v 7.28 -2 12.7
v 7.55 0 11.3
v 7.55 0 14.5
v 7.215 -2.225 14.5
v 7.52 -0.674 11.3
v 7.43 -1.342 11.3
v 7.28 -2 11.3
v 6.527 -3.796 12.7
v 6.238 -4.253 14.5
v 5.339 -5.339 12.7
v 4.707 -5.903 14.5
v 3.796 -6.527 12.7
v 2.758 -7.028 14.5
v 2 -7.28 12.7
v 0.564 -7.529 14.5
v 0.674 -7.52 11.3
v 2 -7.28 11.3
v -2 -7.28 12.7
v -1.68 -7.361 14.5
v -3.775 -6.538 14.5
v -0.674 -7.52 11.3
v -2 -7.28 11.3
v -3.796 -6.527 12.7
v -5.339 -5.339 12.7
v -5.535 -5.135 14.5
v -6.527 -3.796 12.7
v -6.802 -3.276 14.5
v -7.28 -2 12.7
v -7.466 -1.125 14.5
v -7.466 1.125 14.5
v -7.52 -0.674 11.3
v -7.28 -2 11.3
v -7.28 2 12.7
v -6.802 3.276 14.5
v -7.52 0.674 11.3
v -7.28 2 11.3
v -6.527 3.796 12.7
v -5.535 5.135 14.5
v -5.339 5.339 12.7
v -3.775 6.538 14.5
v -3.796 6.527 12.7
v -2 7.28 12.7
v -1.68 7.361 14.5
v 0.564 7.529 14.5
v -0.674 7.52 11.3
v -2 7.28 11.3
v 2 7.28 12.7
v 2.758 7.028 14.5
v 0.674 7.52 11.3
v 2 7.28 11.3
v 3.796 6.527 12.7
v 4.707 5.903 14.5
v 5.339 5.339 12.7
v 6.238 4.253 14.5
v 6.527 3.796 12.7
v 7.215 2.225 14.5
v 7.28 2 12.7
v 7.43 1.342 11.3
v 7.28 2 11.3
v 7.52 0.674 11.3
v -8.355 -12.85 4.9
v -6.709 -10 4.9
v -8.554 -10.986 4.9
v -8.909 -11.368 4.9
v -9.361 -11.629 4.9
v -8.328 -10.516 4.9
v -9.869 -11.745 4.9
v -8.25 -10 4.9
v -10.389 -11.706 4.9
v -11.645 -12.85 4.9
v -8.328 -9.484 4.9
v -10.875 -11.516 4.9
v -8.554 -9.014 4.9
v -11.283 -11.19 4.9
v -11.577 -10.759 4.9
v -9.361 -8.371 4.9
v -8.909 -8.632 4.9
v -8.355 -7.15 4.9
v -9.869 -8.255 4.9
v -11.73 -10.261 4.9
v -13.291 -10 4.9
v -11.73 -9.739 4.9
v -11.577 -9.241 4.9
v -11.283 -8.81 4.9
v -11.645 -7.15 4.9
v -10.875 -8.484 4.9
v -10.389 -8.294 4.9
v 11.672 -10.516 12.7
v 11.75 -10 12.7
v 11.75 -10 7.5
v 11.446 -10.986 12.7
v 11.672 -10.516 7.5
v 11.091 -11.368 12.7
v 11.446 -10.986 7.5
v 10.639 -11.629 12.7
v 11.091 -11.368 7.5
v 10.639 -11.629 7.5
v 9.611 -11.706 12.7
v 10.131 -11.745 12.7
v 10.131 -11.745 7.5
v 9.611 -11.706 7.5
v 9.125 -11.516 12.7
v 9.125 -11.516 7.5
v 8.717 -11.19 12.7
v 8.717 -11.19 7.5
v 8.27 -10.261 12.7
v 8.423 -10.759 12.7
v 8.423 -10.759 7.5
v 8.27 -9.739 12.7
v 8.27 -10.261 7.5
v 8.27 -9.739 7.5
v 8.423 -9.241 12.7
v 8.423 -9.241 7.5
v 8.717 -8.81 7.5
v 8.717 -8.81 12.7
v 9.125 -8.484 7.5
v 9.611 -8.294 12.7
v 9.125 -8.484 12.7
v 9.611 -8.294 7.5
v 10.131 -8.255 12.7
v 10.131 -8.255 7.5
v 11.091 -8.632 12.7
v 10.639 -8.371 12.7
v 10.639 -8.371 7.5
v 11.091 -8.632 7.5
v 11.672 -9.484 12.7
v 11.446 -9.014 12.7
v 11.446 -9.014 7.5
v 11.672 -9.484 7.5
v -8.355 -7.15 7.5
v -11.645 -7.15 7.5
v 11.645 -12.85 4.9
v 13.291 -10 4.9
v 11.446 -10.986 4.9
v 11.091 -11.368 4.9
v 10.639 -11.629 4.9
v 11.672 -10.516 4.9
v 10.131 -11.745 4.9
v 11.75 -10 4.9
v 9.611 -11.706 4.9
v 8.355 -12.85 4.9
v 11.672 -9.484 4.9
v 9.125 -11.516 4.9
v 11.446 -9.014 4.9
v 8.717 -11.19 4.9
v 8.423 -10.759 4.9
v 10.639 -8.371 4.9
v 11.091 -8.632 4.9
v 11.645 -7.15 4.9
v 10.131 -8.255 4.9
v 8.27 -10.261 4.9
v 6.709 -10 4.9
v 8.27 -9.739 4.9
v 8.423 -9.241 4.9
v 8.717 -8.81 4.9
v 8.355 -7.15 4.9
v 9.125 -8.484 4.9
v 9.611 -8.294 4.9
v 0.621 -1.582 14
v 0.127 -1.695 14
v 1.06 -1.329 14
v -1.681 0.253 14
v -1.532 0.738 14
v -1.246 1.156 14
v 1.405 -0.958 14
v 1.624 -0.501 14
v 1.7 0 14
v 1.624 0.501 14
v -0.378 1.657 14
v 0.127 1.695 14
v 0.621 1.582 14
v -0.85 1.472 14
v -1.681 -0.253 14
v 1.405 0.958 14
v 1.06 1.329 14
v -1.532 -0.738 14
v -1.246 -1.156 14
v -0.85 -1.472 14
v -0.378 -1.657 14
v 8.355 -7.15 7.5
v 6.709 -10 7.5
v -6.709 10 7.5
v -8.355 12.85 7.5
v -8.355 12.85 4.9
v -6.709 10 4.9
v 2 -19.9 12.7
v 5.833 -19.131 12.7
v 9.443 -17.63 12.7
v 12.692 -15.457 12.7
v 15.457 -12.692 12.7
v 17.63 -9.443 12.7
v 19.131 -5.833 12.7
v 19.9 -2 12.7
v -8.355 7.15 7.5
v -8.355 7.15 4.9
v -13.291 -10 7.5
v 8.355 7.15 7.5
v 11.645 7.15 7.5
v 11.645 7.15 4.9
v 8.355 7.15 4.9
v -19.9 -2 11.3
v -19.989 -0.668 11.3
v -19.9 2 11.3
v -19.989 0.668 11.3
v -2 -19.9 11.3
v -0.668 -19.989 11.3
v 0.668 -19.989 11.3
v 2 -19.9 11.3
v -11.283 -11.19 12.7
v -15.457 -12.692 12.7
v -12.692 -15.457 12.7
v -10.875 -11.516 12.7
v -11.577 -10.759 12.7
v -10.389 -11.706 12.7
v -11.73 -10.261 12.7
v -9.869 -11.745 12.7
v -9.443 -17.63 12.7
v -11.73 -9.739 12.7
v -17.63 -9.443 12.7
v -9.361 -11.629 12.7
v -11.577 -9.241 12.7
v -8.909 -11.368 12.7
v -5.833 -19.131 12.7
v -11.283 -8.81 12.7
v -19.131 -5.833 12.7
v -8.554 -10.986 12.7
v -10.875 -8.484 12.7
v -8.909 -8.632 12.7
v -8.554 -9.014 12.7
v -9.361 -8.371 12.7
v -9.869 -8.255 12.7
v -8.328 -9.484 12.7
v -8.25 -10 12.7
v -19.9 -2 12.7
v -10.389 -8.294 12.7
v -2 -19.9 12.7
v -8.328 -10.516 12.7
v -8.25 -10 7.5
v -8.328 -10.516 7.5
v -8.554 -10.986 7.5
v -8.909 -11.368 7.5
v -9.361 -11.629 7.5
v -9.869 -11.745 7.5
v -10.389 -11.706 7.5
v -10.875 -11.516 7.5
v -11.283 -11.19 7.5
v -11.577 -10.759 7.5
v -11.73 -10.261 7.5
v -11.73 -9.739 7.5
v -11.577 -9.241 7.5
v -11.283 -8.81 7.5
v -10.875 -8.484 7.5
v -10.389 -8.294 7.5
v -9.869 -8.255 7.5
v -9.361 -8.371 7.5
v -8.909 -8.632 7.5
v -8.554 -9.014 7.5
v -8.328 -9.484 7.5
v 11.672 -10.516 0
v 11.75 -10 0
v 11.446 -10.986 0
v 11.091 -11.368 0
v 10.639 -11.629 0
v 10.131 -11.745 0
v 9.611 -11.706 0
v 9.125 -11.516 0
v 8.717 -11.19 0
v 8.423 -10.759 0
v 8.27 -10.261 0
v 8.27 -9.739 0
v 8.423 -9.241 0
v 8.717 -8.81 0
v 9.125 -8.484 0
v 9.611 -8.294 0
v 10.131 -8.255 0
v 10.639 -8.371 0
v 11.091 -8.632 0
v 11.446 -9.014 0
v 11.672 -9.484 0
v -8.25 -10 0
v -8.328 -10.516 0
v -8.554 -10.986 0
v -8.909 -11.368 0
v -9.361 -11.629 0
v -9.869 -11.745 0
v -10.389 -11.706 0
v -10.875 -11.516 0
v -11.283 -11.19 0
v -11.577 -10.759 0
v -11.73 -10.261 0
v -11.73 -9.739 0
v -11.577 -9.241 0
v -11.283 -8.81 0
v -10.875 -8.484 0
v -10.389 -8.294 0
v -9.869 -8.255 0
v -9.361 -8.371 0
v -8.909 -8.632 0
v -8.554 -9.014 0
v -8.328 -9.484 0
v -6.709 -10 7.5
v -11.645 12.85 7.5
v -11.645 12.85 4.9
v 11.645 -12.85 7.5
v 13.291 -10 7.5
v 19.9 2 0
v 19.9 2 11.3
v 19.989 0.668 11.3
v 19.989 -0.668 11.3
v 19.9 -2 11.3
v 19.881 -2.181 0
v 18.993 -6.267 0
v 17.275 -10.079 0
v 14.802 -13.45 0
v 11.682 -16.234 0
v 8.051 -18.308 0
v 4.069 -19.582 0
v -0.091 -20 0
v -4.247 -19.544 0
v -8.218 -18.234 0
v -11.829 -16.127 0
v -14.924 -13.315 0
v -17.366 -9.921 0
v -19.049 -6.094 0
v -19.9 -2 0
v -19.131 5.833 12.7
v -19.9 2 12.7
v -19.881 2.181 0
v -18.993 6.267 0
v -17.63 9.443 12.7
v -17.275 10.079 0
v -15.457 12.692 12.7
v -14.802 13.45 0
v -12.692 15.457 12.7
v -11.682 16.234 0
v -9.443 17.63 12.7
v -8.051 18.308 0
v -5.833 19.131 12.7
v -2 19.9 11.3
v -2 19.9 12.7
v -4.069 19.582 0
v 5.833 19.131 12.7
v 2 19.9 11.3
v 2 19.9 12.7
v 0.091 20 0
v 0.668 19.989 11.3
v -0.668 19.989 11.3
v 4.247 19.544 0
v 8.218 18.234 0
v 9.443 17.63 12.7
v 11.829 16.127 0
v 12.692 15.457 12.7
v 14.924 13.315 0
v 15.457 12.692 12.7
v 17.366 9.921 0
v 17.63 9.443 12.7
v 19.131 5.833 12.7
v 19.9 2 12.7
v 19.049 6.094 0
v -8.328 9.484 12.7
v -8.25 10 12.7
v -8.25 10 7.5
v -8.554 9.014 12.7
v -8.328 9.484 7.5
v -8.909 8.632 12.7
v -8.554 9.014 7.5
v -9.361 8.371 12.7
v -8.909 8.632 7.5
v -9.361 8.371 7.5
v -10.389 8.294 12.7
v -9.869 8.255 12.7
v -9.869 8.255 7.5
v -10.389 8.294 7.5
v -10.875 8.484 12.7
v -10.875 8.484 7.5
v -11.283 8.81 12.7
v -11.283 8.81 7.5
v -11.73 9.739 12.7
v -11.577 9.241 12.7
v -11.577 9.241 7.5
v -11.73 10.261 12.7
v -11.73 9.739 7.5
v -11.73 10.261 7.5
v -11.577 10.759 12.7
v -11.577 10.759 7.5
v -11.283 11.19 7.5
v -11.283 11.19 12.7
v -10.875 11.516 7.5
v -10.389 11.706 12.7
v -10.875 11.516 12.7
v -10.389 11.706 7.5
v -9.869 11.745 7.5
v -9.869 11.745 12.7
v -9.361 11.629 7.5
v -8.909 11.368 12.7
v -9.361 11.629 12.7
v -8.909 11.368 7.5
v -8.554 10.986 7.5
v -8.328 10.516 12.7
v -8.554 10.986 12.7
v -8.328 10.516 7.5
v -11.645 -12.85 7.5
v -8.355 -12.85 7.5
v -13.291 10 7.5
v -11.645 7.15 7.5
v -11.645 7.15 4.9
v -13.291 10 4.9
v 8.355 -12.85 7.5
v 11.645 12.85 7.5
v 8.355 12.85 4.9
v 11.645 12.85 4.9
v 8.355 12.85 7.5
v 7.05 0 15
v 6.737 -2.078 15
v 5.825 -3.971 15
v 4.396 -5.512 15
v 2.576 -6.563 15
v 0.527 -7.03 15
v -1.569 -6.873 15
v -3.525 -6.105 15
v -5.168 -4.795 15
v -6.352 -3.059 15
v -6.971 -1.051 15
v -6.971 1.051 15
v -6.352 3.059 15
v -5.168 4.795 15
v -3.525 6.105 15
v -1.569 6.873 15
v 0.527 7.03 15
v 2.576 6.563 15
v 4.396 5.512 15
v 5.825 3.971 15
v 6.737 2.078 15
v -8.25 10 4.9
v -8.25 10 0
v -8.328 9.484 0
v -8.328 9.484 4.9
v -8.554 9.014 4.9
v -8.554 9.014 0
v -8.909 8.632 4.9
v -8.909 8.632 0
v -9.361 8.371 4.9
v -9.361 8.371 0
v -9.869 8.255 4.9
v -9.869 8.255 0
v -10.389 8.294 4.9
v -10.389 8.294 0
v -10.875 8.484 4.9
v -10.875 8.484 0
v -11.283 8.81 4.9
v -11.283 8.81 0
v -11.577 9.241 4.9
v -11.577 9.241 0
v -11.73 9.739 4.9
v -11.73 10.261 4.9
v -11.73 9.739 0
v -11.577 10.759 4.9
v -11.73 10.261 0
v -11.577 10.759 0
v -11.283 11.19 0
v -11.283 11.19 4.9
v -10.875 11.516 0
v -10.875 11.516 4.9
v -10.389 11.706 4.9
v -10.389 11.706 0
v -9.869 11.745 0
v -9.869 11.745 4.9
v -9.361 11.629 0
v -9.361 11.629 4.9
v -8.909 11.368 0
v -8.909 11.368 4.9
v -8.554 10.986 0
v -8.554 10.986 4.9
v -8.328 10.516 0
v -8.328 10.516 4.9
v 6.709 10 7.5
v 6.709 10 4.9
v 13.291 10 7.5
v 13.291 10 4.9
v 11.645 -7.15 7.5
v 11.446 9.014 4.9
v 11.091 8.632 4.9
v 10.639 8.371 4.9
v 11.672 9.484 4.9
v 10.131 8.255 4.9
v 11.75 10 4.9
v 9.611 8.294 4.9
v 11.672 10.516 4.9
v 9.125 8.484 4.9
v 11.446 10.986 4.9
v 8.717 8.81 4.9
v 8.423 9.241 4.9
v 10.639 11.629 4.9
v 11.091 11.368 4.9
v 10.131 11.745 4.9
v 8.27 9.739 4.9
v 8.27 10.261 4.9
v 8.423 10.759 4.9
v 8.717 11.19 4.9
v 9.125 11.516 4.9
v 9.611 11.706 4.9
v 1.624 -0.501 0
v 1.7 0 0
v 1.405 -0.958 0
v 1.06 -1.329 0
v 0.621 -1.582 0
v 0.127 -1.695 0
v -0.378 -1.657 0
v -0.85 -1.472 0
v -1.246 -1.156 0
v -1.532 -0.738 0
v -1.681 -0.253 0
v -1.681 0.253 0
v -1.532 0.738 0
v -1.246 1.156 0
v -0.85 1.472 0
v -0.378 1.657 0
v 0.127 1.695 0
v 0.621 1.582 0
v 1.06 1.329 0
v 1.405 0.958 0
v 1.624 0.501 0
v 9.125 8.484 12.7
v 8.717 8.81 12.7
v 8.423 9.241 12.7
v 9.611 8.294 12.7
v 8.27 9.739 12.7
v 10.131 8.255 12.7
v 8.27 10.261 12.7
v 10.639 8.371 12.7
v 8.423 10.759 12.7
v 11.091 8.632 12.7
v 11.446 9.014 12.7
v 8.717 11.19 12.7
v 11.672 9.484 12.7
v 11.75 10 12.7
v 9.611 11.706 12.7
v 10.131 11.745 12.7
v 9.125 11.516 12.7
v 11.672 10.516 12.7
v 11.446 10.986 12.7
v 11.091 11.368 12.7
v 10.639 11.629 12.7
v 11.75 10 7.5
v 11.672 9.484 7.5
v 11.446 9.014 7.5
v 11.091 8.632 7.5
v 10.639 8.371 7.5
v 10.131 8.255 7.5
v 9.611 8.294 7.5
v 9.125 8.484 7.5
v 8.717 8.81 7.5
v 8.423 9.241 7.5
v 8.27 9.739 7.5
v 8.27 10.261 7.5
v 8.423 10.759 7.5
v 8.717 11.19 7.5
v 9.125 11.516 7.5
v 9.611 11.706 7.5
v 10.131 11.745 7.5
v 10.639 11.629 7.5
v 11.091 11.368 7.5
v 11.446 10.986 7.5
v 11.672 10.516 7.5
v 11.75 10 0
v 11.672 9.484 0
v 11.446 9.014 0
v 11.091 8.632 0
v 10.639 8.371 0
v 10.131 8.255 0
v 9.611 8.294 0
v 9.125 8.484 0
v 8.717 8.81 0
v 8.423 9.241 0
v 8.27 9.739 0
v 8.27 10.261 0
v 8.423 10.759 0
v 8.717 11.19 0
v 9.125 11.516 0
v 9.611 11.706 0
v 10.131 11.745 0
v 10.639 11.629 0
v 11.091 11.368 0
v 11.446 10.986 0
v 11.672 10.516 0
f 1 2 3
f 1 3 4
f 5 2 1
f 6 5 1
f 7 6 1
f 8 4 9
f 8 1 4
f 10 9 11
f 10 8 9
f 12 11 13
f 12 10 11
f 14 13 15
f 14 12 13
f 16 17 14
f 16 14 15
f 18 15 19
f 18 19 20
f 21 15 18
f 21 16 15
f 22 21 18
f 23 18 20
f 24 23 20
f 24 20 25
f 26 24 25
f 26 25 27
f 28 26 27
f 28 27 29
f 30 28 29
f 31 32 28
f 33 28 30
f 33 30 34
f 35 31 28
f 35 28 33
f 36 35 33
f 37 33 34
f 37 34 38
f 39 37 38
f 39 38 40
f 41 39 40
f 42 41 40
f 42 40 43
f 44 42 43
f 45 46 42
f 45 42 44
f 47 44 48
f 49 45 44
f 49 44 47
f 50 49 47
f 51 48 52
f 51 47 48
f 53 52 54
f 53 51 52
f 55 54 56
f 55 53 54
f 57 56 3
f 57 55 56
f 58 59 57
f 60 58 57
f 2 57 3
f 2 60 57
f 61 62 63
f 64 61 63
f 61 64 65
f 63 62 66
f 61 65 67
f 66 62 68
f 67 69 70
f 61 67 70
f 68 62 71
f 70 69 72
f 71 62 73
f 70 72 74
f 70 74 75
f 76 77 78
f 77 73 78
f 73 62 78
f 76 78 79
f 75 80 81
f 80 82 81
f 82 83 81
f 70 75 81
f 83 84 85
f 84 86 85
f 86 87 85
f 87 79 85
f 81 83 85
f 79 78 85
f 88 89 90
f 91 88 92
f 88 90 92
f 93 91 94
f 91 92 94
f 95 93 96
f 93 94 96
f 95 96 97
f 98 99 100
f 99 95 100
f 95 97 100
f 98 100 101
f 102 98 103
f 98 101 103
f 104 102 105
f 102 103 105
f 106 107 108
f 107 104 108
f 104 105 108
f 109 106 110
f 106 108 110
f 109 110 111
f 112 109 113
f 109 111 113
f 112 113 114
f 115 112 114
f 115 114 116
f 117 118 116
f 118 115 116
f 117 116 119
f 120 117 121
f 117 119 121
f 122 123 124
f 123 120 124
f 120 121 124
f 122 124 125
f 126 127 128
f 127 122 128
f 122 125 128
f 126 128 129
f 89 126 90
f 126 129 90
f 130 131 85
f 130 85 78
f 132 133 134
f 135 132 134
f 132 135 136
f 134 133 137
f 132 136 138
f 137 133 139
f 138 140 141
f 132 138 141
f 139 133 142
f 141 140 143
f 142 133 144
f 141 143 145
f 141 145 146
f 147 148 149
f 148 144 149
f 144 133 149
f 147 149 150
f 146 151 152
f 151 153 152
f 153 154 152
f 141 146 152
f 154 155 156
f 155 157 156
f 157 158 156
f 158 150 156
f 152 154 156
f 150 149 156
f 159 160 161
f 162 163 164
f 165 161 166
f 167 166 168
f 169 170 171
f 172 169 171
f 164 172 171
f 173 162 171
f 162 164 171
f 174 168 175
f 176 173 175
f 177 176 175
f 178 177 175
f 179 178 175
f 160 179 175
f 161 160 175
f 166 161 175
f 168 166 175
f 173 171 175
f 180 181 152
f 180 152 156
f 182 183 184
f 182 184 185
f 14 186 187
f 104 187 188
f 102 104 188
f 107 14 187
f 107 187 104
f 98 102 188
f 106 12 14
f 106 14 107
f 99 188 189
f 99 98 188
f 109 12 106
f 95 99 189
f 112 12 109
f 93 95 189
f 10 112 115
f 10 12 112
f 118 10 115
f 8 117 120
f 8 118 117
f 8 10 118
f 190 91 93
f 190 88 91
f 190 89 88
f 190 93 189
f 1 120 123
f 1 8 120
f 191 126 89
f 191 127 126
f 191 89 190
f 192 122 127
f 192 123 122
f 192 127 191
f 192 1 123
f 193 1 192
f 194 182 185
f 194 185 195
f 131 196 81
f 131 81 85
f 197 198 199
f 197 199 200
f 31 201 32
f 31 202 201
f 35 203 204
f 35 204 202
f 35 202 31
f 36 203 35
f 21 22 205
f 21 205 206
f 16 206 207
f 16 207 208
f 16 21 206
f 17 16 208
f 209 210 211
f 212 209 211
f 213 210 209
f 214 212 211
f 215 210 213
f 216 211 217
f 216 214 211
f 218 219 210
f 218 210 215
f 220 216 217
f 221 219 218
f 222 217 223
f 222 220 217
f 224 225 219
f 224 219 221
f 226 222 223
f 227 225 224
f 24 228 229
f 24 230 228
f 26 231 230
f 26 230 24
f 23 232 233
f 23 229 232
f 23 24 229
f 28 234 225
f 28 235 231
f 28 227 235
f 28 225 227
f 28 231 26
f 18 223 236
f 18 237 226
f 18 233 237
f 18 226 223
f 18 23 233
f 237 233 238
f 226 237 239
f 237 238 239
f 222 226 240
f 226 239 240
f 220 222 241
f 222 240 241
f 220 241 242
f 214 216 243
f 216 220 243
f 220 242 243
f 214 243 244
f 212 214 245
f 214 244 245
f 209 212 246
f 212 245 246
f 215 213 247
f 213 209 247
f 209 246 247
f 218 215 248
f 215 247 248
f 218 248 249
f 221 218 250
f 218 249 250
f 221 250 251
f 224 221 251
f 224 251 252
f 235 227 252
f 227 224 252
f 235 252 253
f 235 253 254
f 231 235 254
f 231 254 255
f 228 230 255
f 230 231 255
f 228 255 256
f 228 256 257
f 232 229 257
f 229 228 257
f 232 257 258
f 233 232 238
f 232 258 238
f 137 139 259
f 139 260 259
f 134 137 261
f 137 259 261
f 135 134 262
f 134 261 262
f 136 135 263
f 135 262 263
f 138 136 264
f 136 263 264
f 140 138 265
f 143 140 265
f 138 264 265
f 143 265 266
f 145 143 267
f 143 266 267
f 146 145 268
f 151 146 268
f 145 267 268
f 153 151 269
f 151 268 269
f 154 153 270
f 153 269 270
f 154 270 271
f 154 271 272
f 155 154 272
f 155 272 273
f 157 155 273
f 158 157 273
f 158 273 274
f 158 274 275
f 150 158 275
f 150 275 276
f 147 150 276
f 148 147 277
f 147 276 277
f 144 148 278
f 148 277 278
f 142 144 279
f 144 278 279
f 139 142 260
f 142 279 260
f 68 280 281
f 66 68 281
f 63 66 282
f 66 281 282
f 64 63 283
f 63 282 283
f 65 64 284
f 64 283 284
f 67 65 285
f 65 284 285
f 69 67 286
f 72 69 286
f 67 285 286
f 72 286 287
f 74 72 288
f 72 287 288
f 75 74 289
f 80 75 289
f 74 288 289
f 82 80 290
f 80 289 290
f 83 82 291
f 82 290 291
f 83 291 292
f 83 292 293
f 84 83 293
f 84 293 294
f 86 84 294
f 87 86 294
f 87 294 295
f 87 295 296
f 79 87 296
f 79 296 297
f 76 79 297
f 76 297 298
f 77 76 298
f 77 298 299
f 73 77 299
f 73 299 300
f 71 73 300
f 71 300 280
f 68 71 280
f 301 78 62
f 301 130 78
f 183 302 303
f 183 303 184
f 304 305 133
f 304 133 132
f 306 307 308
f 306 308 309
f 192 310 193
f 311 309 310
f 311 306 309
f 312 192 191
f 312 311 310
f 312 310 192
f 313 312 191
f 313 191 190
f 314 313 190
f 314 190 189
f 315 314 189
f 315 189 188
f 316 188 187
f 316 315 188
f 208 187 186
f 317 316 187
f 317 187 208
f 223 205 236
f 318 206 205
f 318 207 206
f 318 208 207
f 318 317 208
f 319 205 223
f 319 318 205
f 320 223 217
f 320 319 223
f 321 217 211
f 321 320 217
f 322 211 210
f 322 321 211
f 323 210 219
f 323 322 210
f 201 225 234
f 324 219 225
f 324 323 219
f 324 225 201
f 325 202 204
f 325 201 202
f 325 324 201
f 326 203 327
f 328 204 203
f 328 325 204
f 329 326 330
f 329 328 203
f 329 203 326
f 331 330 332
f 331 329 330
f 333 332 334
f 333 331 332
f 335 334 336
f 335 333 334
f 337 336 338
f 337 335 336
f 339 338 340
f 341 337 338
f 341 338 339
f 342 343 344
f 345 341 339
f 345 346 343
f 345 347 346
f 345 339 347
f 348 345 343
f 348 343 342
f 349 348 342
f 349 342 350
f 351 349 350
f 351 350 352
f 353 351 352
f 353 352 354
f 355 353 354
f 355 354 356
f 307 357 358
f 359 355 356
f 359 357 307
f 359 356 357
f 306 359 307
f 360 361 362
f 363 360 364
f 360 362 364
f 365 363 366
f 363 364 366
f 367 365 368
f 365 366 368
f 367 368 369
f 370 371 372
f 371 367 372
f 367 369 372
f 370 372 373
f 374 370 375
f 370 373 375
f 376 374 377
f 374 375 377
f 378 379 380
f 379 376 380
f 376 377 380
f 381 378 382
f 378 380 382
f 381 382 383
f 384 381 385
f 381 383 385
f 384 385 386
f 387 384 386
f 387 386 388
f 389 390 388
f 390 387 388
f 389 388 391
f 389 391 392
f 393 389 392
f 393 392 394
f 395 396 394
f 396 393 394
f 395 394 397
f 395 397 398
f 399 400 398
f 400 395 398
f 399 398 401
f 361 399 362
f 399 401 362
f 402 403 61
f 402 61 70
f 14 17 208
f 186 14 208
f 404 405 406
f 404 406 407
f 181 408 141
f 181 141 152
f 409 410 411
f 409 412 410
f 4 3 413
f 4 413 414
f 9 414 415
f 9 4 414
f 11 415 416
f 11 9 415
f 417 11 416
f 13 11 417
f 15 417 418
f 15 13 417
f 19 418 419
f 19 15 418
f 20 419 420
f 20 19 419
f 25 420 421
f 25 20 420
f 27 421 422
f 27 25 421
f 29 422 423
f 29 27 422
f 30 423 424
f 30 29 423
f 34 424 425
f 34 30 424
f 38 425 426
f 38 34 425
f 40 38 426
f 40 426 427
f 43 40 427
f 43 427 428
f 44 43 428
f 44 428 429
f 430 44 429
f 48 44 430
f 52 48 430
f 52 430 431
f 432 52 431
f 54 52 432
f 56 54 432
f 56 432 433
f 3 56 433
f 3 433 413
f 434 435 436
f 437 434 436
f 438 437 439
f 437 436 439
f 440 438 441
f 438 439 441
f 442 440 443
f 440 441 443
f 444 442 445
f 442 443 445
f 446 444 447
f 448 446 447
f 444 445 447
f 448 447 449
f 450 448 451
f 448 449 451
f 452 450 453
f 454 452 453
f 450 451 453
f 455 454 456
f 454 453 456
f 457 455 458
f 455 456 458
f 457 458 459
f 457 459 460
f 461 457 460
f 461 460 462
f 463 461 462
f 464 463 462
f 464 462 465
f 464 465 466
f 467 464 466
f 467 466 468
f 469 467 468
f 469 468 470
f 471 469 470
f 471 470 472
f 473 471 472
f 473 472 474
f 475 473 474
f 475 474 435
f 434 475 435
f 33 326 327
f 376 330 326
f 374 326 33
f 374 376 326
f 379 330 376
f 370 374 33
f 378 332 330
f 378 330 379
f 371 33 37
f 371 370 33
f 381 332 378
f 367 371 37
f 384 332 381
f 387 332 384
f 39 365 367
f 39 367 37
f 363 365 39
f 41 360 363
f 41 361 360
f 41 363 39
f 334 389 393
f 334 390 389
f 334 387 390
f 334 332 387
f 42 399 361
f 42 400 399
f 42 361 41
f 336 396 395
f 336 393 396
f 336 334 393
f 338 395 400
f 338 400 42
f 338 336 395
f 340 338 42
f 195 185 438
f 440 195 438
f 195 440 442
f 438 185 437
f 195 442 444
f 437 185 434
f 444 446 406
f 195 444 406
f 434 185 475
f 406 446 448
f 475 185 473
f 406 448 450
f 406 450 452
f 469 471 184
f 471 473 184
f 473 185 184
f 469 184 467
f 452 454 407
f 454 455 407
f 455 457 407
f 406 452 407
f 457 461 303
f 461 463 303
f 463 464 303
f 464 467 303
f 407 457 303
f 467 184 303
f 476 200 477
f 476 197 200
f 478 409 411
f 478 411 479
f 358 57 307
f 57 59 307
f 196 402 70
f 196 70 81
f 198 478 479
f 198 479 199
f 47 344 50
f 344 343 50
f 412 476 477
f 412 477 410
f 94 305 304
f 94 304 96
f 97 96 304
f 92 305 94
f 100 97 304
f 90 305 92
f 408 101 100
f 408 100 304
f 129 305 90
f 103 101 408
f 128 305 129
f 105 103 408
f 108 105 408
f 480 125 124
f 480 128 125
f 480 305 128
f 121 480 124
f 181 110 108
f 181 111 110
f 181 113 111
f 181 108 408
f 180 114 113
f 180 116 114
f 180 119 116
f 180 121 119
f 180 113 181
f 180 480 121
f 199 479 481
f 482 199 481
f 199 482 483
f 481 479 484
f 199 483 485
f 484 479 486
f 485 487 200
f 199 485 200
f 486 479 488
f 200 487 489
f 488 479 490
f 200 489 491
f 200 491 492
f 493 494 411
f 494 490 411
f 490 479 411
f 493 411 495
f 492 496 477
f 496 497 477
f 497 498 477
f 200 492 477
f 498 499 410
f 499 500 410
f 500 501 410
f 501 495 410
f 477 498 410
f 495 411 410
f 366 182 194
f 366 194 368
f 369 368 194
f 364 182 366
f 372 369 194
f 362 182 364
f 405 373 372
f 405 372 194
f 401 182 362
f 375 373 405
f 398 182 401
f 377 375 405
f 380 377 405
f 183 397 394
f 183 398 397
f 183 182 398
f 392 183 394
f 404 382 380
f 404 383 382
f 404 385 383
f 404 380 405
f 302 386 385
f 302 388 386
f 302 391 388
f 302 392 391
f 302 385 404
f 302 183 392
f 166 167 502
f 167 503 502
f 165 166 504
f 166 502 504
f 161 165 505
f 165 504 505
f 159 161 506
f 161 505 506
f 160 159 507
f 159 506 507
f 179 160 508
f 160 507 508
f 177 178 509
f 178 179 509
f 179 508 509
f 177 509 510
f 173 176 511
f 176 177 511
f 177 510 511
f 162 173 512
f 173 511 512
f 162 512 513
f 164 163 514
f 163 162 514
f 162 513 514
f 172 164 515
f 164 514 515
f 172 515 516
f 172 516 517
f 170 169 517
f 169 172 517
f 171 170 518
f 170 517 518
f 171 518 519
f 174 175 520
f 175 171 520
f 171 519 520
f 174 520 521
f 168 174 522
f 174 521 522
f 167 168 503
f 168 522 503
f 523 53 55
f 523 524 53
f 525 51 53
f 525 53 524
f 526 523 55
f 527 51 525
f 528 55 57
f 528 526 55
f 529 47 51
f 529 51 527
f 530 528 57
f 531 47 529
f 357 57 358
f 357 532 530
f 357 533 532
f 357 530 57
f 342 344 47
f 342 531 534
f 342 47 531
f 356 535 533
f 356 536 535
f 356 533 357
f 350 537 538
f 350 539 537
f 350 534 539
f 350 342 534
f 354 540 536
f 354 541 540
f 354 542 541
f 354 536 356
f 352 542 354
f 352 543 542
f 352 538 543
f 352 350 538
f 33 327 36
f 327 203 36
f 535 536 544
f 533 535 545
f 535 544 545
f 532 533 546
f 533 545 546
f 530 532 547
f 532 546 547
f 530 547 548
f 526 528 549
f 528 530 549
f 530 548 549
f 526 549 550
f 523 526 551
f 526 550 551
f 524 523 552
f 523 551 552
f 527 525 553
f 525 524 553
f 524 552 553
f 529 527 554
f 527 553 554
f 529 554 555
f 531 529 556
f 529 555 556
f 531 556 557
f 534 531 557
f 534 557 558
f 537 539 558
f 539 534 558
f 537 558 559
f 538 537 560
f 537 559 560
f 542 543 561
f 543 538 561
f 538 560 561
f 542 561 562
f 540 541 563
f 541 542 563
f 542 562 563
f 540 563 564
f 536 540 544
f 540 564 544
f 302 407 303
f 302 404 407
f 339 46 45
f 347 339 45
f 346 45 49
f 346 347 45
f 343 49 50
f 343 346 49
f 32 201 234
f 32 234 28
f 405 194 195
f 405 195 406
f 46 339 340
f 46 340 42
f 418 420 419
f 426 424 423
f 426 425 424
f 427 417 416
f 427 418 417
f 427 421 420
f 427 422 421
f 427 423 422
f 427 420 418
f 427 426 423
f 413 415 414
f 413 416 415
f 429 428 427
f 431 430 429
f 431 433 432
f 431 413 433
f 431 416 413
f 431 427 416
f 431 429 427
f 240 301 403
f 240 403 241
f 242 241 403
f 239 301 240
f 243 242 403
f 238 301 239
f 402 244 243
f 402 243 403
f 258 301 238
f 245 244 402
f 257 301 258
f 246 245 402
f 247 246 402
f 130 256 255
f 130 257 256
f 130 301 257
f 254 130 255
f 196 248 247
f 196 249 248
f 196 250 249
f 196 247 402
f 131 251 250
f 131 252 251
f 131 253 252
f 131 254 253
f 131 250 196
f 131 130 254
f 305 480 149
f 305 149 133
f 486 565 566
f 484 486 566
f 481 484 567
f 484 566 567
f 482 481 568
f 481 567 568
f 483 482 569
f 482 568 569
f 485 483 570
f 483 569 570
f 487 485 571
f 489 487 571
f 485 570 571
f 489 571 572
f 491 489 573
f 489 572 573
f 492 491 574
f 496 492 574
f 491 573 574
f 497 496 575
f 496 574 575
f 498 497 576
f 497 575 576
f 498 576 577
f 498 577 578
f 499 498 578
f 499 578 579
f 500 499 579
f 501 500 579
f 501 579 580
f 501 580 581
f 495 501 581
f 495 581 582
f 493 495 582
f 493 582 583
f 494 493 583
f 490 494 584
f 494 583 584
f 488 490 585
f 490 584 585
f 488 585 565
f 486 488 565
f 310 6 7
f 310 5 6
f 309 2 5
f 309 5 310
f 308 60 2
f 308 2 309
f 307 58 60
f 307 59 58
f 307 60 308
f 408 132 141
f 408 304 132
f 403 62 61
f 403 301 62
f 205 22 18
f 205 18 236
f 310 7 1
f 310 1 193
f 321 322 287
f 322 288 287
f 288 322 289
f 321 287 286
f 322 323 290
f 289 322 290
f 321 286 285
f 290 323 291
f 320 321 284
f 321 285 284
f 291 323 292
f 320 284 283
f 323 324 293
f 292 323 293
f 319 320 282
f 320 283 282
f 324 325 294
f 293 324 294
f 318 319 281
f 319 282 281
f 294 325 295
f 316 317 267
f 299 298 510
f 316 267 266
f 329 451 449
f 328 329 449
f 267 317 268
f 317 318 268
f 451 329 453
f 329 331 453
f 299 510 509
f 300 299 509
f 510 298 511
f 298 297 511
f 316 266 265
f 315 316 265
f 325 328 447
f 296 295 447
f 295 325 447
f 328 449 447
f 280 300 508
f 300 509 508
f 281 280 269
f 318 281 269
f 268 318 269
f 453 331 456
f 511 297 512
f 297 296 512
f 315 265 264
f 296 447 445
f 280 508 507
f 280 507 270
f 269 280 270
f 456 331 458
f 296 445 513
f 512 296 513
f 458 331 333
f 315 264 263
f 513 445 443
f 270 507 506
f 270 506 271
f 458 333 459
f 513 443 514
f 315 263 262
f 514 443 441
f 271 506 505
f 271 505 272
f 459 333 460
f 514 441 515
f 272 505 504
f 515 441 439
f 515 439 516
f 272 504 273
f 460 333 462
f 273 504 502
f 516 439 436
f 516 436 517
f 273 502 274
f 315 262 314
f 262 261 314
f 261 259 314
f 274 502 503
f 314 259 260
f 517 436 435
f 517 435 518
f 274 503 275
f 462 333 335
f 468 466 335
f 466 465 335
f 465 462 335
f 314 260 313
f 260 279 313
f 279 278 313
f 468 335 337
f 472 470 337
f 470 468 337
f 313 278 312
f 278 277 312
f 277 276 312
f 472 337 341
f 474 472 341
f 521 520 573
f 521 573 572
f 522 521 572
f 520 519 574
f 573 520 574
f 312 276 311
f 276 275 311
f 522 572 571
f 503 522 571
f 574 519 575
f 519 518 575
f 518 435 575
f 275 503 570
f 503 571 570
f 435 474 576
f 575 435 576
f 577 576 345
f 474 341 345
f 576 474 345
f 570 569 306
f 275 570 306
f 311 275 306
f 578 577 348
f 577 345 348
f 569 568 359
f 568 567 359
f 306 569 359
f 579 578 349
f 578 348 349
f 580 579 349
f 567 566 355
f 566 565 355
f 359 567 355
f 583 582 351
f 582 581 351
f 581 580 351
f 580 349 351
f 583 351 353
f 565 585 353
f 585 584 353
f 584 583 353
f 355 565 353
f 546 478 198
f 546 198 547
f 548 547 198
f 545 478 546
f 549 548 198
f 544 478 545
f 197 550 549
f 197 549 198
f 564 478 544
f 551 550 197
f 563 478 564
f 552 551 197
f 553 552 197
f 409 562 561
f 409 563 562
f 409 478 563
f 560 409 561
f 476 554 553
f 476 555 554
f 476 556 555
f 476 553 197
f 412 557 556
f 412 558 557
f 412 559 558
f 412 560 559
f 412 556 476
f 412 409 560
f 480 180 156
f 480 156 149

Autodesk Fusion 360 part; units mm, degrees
sketch "Skizze1" plane through (0, 0, 0) normal (0, 0, 1) x (1, 0, 0)
  circle A0 centre (0, 0) radius 20
  circle A1 centre (0, 0) radius 1.7
  line L0 (0, 23) -> (0, -24.4681) construction
  circle A2 centre (0, 0) radius 7.55
  line L1 (24, 0) -> (-23.5704, 0) construction
  line L2 (-23.8139, 10) -> (38.4686, 10) construction
  line L3 (-25.6457, -10) -> (29, -10) construction
  line L4 (-10, 25.6893) -> (-10, -22.4618) construction
  line L5 (10, 21.0661) -> (10, -25) construction
  circle A3 centre (-10, 10) radius 1.75
  circle A4 centre (10, 10) radius 1.75
  circle A5 centre (10, -10) radius 1.75
  circle A6 centre (-10, -10) radius 1.75
  line L6 (-2, 19.8997) -> (-2, -19.8997)
  line L7 (2, 19.8997) -> (2, -19.8997)
  line L8 (-19.8997, 2) -> (19.8997, 2)
  line L9 (-19.8997, -2) -> (19.8997, -2)
  point P0 (-10, 10)
  point P1 (10, 10)
  point P2 (10, -10)
  point P3 (-10, -10)
  dimension "d1" = 40
  dimension "d2" = 3.4
  dimension "d25" = 15.1
  dimension "d69" = 10
  dimension "d70" = 10
  dimension "d71" = 10
  dimension "d72" = 10
  dimension "d73" = 3.5
  dimension "d74" = 3.5
  dimension "d75" = 3.5
  dimension "d76" = 3.5
  dimension "d85" = 2
  dimension "d86" = 2
  dimension "d87" = 2
  dimension "d88" = 2
extrude "Extrusion1" add sketch "Skizze1" along normal blind 15 contours A2 L7 L8 | A2 L7 L8 L9 | A2 L7 L9 | A2 L6 L7 L8 | L6 L7 L8 L9 | A2 L6 L7 L9 | A2 L6 L8 | A2 L6 L8 L9 | A2 L6 L9 | A1
extrude "Extrusion2" cut sketch "Skizze1" along normal blind 14 contours A1
extrude "Extrusion5" add sketch "Skizze1" along normal blind 12.7 contours A0 A2 L7 L8 | A0 A2 L7 L9 | A0 A2 L6 L8 | A0 A2 L6 L9
extrude "Extrusion11" add sketch "Skizze1" along normal blind 11.3 contours A0 A2 L8 L9 | A0 A2 L6 L7 | A0 A2 L6 L7 | A0 A2 L8 L9
ref_plane "Arbeitsebene1" through (0, 0, 7.5) normal (0, 0, -1) x (-1, 0, 0)
sketch "Skizze2" plane through (0, 0, 7.5) normal (0, 0, -1) x (-1, 0, 0)
  line L0 (0, 19.4975) -> (0, -17.4097) construction
  line L1 (-20.2047, 0) -> (24.515, 0) construction
  line L2 (11, 10) -> (-11.3533, 10) construction
  line L3 (11, -10) -> (-11, -10) construction
  line L4 (10, 11.7482) -> (10, -12.1179) construction
  line L5 (-10, 11.5155) -> (-10, -12.3496) construction
  line L6 (11.6454, 7.15) -> (13.2909, 10)
  line L7 (13.2909, 10) -> (11.6454, 12.85)
  line L8 (11.6454, 12.85) -> (8.3546, 12.85)
  line L9 (8.3546, 12.85) -> (6.7091, 10)
  line L10 (6.7091, 10) -> (8.3546, 7.15)
  line L11 (8.3546, 7.15) -> (11.6454, 7.15)
  line L12 (-8.3546, 7.15) -> (-6.7091, 10)
  line L13 (-6.7091, 10) -> (-8.3546, 12.85)
  line L14 (-8.3546, 12.85) -> (-11.6454, 12.85)
  line L15 (-11.6454, 12.85) -> (-13.2909, 10)
  line L16 (-13.2909, 10) -> (-11.6454, 7.15)
  line L17 (-11.6454, 7.15) -> (-8.3546, 7.15)
  line L18 (-11.6454, -7.15) -> (-13.2909, -10)
  line L19 (-13.2909, -10) -> (-11.6454, -12.85)
  line L20 (-11.6454, -12.85) -> (-8.3546, -12.85)
  line L21 (-8.3546, -12.85) -> (-6.7091, -10)
  line L22 (-6.7091, -10) -> (-8.3546, -7.15)
  line L23 (-8.3546, -7.15) -> (-11.6454, -7.15)
  line L24 (8.3546, -7.15) -> (6.7091, -10)
  line L25 (6.7091, -10) -> (8.3546, -12.85)
  line L26 (8.3546, -12.85) -> (11.6454, -12.85)
  line L27 (11.6454, -12.85) -> (13.2909, -10)
  line L28 (13.2909, -10) -> (11.6454, -7.15)
  line L29 (11.6454, -7.15) -> (8.3546, -7.15)
  point P0 (10, 10)
  point P1 (-10, 10)
  point P2 (-10, -10)
  point P3 (10, -10)
  dimension "d77" = 10
  dimension "d78" = 10
  dimension "d79" = 10
  dimension "d80" = 10
  dimension "d81" = 5.7
  dimension "d82" = 5.7
  dimension "d83" = 5.7
  dimension "d84" = 5.7
extrude "Extrusion4" cut sketch "Skizze2" along normal blind 2.6
chamfer "Fase2" distance 0.5 angle 45 1 edges at (-7.0391, -2.7302, 15)
